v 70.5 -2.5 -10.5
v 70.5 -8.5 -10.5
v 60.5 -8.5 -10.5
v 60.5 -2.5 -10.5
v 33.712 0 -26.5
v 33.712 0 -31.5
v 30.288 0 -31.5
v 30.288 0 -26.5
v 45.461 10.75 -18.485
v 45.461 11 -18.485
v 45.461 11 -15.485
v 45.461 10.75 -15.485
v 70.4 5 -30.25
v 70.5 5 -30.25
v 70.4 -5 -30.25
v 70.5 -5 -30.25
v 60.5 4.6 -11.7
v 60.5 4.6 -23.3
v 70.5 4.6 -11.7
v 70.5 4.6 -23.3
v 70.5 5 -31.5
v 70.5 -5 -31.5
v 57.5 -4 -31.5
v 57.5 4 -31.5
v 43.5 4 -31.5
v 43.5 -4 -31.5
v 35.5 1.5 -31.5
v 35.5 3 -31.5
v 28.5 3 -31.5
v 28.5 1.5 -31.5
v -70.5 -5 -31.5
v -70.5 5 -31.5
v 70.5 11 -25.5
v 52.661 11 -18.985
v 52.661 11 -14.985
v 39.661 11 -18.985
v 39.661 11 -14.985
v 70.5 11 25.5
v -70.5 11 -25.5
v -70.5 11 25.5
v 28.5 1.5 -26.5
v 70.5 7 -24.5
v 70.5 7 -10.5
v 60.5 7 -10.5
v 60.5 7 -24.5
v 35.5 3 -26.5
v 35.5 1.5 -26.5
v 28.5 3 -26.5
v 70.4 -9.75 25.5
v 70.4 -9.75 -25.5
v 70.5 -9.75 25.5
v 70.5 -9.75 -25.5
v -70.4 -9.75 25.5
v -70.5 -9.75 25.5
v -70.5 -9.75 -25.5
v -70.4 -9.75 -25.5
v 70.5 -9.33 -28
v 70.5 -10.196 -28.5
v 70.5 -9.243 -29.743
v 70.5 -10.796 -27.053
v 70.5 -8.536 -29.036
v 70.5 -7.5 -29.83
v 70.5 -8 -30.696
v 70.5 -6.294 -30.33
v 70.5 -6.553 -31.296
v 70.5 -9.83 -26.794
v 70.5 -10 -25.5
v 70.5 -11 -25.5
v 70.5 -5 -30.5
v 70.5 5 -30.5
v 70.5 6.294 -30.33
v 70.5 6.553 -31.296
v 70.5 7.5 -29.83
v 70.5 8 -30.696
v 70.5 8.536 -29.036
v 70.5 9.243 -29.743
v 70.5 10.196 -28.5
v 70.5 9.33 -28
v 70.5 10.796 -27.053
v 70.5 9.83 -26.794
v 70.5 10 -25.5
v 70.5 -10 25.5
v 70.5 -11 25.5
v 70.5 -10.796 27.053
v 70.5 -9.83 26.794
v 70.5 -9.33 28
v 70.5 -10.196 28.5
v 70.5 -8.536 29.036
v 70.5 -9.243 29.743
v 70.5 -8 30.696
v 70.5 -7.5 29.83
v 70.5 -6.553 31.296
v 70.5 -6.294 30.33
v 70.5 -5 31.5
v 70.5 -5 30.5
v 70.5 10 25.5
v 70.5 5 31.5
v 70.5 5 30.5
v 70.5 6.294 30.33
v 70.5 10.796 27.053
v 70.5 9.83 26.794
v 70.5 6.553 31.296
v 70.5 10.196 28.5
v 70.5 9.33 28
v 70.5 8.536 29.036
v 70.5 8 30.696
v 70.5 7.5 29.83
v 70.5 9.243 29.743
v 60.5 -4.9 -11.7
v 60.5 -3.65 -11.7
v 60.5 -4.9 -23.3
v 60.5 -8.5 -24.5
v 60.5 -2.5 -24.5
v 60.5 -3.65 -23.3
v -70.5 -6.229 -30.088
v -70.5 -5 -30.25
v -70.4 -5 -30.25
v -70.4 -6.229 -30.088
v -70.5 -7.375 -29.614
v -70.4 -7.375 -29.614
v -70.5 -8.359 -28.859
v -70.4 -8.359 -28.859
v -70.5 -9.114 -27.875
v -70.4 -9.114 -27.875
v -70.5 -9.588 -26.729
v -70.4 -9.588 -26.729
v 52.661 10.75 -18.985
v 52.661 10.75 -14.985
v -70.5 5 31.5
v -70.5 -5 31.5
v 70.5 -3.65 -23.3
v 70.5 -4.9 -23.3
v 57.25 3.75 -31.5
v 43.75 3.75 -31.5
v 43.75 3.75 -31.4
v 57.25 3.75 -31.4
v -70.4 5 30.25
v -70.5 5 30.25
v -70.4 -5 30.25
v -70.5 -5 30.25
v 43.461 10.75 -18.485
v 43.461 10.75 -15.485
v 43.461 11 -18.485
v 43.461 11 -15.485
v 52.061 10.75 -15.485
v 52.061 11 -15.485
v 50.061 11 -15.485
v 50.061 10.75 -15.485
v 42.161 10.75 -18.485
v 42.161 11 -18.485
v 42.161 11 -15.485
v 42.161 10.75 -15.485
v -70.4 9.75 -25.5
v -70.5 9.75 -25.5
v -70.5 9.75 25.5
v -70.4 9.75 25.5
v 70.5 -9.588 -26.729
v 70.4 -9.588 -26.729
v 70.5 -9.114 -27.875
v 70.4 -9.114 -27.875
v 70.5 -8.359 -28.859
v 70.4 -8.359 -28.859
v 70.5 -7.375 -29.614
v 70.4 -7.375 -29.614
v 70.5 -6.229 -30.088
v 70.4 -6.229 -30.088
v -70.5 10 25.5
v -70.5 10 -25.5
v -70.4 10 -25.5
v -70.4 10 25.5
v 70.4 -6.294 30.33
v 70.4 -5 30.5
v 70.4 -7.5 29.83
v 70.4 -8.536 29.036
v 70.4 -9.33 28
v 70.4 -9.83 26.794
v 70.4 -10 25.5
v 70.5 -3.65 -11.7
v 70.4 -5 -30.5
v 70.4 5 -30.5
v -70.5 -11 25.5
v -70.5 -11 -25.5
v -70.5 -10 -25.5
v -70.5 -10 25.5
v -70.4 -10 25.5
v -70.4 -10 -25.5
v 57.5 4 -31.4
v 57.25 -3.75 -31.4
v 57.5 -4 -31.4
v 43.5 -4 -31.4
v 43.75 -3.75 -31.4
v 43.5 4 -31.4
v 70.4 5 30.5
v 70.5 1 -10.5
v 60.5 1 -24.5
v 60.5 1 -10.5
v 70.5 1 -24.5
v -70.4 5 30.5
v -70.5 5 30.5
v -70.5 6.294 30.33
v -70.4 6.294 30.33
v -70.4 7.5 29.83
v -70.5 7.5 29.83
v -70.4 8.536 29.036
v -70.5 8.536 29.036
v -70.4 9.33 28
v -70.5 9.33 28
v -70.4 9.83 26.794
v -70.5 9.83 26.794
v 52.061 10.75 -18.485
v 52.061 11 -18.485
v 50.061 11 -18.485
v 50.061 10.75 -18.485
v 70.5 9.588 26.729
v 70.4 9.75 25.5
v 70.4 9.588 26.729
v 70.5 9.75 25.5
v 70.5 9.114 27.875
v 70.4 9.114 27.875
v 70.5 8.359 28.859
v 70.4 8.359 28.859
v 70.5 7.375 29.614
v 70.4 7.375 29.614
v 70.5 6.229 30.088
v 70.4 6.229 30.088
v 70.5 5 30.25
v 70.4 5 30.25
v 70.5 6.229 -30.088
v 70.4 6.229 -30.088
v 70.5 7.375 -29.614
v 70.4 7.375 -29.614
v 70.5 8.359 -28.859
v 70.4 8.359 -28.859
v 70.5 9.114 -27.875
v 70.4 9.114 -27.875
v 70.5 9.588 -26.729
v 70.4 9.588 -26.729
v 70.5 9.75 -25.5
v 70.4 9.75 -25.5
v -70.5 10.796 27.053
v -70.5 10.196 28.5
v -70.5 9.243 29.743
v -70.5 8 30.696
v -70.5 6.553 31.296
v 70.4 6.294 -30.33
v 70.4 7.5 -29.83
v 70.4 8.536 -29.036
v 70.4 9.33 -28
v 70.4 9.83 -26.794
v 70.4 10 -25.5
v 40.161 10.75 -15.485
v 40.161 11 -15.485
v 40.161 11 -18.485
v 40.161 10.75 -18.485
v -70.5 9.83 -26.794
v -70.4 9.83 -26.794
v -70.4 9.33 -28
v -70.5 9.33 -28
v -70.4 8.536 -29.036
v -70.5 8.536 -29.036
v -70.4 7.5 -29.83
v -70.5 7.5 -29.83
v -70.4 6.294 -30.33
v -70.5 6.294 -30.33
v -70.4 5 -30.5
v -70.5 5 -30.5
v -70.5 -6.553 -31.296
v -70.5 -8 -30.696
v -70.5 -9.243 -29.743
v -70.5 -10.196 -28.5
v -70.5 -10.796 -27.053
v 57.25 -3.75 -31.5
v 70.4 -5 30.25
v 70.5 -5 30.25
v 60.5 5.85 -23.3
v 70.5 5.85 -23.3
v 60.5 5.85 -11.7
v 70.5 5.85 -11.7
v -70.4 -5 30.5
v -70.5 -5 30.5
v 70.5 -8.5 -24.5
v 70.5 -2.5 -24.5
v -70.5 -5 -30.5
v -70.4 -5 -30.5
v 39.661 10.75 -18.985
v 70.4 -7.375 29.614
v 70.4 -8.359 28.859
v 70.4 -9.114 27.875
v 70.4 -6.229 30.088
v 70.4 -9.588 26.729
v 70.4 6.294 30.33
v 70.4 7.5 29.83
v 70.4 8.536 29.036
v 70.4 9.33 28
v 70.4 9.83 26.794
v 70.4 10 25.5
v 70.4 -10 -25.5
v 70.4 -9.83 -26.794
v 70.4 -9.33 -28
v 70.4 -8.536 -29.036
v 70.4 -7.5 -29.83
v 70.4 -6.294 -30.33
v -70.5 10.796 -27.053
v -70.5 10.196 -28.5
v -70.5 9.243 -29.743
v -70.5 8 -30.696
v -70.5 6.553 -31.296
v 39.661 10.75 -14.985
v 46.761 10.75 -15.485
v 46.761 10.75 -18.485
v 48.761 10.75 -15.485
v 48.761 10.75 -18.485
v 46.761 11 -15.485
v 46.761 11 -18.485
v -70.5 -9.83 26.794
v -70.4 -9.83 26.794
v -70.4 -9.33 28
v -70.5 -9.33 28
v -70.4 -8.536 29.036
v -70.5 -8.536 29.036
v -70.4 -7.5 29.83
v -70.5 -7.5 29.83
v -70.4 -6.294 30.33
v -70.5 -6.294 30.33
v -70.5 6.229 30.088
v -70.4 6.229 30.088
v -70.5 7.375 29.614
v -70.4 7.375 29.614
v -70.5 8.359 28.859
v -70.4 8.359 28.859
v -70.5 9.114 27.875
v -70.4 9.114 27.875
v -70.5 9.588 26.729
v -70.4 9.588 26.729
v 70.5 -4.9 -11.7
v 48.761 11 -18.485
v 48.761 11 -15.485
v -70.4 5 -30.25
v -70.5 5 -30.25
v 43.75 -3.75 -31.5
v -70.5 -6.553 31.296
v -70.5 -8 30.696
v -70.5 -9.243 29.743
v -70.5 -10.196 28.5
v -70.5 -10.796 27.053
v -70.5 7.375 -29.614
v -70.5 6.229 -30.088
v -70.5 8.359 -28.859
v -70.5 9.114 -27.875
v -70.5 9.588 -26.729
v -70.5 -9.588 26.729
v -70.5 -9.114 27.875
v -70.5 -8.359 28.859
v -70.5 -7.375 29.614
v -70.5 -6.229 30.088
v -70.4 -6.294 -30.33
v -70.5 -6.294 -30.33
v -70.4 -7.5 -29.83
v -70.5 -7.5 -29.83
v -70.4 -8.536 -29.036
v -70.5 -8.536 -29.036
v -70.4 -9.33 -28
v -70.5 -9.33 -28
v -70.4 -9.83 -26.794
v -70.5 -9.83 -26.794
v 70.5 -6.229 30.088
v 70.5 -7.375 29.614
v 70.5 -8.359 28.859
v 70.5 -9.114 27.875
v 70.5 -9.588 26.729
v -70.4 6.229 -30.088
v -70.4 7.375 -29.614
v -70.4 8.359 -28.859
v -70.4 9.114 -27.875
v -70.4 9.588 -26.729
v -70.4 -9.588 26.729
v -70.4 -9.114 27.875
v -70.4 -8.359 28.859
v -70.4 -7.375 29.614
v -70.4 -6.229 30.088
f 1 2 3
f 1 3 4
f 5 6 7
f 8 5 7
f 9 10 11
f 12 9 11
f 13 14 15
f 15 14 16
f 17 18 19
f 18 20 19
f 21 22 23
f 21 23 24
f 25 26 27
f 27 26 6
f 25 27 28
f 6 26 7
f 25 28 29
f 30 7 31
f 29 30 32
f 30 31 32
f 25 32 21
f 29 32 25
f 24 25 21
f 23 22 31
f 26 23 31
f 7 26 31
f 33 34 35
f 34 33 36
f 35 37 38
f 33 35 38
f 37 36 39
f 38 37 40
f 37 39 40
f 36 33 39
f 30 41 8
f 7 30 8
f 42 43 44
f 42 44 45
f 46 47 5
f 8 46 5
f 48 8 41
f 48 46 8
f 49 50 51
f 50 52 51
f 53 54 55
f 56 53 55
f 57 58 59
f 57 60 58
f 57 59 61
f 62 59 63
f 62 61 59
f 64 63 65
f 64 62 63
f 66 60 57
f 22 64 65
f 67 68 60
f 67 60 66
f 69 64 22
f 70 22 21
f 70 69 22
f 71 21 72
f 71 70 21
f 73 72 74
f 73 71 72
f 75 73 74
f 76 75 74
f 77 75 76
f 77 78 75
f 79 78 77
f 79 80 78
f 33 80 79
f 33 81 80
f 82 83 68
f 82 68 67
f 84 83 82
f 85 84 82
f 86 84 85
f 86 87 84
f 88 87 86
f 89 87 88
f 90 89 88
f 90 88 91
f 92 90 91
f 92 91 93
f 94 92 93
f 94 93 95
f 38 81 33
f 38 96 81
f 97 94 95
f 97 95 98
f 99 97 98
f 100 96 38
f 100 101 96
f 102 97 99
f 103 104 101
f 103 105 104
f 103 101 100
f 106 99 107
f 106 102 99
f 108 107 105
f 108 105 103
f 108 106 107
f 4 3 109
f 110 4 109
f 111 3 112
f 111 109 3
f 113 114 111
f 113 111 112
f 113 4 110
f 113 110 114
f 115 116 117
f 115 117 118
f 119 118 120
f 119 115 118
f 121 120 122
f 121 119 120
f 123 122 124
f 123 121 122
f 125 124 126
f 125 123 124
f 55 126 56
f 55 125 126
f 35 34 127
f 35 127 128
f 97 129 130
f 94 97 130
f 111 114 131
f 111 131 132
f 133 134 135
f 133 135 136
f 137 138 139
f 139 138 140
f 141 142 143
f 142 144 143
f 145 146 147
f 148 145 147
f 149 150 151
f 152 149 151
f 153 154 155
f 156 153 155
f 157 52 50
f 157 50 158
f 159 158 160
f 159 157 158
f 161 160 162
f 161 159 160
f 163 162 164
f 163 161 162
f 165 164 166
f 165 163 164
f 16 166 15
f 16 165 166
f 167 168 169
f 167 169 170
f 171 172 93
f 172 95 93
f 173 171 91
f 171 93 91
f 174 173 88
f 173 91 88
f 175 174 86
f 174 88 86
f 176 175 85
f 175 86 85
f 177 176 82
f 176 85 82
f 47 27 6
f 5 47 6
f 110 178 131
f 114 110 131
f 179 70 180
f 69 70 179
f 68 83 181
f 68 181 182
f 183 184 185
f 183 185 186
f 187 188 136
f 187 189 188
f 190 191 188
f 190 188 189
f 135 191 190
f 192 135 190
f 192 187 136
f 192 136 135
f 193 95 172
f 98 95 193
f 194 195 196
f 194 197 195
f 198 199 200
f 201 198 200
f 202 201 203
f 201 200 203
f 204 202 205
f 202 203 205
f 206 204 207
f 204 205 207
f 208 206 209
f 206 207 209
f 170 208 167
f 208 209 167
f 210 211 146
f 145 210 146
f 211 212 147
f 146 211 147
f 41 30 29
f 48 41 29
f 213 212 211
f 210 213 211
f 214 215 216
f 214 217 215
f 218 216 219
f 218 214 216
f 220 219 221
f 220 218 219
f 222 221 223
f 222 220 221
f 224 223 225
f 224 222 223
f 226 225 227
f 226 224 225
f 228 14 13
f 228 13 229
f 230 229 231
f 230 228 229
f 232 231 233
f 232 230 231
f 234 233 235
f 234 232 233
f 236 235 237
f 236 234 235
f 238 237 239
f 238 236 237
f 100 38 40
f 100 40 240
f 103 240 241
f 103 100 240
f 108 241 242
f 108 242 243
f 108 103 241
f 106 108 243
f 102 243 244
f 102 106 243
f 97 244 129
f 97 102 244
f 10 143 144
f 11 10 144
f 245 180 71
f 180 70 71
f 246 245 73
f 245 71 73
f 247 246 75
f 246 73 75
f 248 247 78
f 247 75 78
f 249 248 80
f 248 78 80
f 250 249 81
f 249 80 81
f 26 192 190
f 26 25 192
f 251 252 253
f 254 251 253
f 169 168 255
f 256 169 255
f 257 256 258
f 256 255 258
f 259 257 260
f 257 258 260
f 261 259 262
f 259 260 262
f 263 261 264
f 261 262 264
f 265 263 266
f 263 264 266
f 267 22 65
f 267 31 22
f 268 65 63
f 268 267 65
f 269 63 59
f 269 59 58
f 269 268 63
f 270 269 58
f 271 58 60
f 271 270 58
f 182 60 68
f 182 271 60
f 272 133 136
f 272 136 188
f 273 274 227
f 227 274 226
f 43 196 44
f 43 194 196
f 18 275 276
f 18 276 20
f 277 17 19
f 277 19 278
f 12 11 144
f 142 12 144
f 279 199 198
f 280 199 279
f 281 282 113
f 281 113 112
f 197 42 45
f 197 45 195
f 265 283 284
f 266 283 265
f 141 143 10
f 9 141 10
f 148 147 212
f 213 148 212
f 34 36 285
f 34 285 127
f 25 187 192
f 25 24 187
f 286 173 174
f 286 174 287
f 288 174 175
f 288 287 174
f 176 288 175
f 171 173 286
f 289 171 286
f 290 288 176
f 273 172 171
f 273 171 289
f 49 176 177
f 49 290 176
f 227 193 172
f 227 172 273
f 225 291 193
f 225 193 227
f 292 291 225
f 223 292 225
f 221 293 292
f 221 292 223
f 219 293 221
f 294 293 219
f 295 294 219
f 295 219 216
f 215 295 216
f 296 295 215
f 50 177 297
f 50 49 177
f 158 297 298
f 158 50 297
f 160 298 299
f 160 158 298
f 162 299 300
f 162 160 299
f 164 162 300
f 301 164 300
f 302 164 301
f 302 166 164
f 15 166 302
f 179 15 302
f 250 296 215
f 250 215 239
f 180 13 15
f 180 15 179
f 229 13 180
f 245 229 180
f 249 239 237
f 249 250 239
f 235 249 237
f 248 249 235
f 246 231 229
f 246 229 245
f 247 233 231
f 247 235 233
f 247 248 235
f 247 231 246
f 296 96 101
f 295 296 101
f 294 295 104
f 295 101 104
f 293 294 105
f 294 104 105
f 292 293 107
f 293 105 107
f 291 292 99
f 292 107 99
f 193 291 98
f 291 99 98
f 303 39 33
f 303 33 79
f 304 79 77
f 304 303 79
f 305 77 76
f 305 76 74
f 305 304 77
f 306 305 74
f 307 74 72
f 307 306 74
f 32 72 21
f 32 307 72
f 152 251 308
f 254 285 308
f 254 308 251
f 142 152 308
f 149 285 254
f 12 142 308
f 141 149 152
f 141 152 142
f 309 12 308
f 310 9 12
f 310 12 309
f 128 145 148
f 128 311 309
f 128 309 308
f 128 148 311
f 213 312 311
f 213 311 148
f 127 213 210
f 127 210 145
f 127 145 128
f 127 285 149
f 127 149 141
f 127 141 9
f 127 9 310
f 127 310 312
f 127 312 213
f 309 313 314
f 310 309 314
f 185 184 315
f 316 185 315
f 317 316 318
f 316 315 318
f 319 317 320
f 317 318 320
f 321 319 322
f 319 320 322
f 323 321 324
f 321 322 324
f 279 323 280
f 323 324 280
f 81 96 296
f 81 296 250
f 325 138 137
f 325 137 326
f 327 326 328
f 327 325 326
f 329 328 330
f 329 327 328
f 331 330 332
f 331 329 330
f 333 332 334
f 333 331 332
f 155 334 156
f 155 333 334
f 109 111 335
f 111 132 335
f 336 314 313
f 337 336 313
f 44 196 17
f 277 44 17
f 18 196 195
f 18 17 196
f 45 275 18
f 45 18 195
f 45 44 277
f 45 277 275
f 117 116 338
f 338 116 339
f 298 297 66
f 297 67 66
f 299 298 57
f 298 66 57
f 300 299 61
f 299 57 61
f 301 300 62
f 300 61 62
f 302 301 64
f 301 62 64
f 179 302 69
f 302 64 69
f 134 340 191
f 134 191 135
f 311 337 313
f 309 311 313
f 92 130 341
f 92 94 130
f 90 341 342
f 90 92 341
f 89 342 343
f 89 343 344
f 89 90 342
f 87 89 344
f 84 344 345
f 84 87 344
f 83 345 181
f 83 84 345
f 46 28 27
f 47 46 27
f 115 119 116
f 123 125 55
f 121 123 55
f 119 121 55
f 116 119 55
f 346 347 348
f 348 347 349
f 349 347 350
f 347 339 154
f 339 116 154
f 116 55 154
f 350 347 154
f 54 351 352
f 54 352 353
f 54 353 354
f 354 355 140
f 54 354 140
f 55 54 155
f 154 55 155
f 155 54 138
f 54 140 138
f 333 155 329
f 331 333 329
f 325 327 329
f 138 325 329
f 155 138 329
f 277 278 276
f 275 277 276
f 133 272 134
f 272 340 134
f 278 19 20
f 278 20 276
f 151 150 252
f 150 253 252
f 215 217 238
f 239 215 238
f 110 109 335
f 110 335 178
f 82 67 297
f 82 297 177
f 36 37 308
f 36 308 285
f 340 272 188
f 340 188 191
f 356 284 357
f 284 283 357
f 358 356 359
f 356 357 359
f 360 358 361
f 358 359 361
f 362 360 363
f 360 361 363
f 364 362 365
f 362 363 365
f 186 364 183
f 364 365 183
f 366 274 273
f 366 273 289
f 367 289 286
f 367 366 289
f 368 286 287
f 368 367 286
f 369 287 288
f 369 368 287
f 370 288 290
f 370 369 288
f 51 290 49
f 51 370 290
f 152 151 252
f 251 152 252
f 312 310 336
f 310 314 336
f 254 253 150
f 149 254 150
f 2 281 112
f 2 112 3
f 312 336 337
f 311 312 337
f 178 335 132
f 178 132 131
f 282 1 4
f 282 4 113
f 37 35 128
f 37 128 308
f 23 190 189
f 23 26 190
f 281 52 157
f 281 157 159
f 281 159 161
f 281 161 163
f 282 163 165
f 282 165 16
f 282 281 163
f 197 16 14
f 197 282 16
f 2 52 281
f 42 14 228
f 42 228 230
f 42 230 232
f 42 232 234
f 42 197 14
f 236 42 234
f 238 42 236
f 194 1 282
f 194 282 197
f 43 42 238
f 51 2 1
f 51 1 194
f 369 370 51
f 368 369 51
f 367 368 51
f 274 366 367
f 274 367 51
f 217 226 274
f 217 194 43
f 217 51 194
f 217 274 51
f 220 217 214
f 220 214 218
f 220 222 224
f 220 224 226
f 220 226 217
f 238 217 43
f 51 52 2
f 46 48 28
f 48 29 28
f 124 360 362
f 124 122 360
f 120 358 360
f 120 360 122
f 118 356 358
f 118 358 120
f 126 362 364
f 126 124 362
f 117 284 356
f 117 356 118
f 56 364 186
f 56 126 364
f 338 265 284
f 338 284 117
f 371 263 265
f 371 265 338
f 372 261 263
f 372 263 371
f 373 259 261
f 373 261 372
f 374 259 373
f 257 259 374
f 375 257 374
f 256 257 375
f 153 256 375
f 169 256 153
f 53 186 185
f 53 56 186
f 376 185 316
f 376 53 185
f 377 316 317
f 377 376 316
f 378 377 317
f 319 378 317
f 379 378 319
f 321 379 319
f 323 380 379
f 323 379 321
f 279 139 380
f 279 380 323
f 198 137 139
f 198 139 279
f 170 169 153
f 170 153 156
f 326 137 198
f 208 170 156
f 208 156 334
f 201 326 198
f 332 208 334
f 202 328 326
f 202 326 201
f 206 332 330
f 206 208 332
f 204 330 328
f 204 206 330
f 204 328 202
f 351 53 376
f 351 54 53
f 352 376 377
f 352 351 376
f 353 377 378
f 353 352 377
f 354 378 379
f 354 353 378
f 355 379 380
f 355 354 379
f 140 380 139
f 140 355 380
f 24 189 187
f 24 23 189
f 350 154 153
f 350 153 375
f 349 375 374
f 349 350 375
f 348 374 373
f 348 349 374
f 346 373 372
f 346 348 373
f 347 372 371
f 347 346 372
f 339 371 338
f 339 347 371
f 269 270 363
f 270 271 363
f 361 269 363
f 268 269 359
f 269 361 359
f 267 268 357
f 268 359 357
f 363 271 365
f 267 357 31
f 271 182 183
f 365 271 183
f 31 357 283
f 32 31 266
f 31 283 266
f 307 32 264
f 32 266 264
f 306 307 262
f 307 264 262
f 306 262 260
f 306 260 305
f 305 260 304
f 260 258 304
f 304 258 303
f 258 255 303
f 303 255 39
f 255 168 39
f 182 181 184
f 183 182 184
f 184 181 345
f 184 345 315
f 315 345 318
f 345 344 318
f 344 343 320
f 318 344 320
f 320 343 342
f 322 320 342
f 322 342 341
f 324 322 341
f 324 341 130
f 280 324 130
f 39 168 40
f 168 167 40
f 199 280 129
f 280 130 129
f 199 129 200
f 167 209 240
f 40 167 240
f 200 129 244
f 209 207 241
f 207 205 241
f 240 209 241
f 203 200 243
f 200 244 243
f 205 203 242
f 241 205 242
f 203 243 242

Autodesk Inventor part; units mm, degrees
ref_plane "YZ Plane" through (0, 0, 0) normal (1, 0, 0) x (0, 1, 0)
ref_plane "XZ Plane" through (0, 0, 0) normal (0, 1, 0) x (-1, 0, 0)
ref_plane "XY Plane" through (0, 0, 0) normal (0, 0, 1) x (1, 0, 0)
sketch "Sketch1" plane through (0, 0, 0) normal (1, 0, 0) x (0, 1, 0)
  line L0 (11, 31.5) -> (-11, 31.5)
  line L1 (-11, 31.5) -> (-11, -31.5)
  line L2 (-11, -31.5) -> (11, -31.5)
  line L3 (11, -31.5) -> (11, 31.5)
  line L4 (11, 31.5) -> (-11, -31.5) construction
  line L5 (-11, 31.5) -> (11, -31.5) construction
  point P0 (0, 0)
  dimension "d0" = 22
  dimension "d1" = 63
extrude "Extrusion1" add sketch "Sketch1" along normal mid plane 141
fillet "Fillet1" radius 6 4 edges at (0, 11, 31.5) (0, 11, -31.5) (0, -11, 31.5) (0, -11, -31.5)
sketch "Sketch2" plane through (70.5, 0, 0) normal (1, 0, 0) x (0, 0, -1)
  line L0 (10.5, 7) -> (24.5, 7)
  line L1 (24.5, 7) -> (24.5, 1)
  line L2 (24.5, 1) -> (10.5, 1)
  line L3 (10.5, 1) -> (10.5, 7)
  line L4 (31.5, -5) -> (31.5, 5) projected
  line L5 (25.5, 11) -> (-25.5, 11) projected
  line L6 (11.7, 5.85) -> (23.3, 5.85)
  line L7 (23.3, 5.85) -> (23.3, 4.6)
  line L8 (23.3, 4.6) -> (11.7, 4.6)
  line L9 (11.7, 4.6) -> (11.7, 5.85)
  line L10 (10.5, -2.5) -> (24.5, -2.5)
  line L11 (24.5, -2.5) -> (24.5, -8.5)
  line L12 (24.5, -8.5) -> (10.5, -8.5)
  line L13 (10.5, -8.5) -> (10.5, -2.5)
  line L14 (11.7, -3.65) -> (23.3, -3.65)
  line L15 (23.3, -3.65) -> (23.3, -4.9)
  line L16 (23.3, -4.9) -> (11.7, -4.9)
  line L17 (11.7, -4.9) -> (11.7, -3.65)
  point P0 (0, 0)
  dimension "d5" = 14
  dimension "d6" = 6
  dimension "d7" = 7
  dimension "d8" = 4
  dimension "d12" = 1.2
  dimension "d13" = 1.2
  dimension "d14" = 1.15
  dimension "d15" = 3.6
  dimension "d16" = 14
  dimension "d17" = 6
  dimension "d18" = 1.2
  dimension "d19" = 1.2
  dimension "d20" = 1.15
  dimension "d21" = 3.6
  dimension "d22" = 3.5
extrude "Extrusion2" cut sketch "Sketch2" against normal blind 10
sketch "Sketch3" plane through (-70.5, 11, -25.5) normal (0, 1, 0) x (1, 0, 0)
  line L0 (110.1613, -6.5149) -> (123.1613, -6.5149)
  line L1 (123.1613, -6.5149) -> (123.1613, -10.5149)
  line L2 (123.1613, -10.5149) -> (110.1613, -10.5149)
  line L3 (110.1613, -10.5149) -> (110.1613, -6.5149)
  line L4 (110.6613, -7.0149) -> (112.6613, -7.0149)
  line L5 (112.6613, -7.0149) -> (112.6613, -10.0149)
  line L6 (112.6613, -10.0149) -> (110.6613, -10.0149)
  line L7 (110.6613, -10.0149) -> (110.6613, -7.0149)
  line L8 (115.9613, -10.0149) -> (113.9613, -10.0149)
  line L9 (113.9613, -10.0149) -> (113.9613, -7.0149)
  line L10 (113.9613, -7.0149) -> (115.9613, -7.0149)
  line L11 (115.9613, -7.0149) -> (115.9613, -10.0149)
  line L12 (119.2613, -10.0149) -> (117.2613, -10.0149)
  line L13 (117.2613, -10.0149) -> (117.2613, -7.0149)
  line L14 (117.2613, -7.0149) -> (119.2613, -7.0149)
  line L15 (119.2613, -7.0149) -> (119.2613, -10.0149)
  line L16 (122.5613, -10.0149) -> (120.5613, -10.0149)
  line L17 (120.5613, -10.0149) -> (120.5613, -7.0149)
  line L18 (120.5613, -7.0149) -> (122.5613, -7.0149)
  line L19 (122.5613, -7.0149) -> (122.5613, -10.0149)
  point P0 (70.5, -25.5)
  dimension "d25" = 13
  dimension "d26" = 4
  dimension "d27" = 2
  dimension "d28" = 3
  dimension "d29" = 0.5
  dimension "d30" = 0.5
  dimension "d33" = 3.3
extrude "Extrusion3" cut sketch "Sketch3" against normal blind 0.25
sketch "Sketch4" plane through (70.5, -5, -31.5) normal (0, 0, -1) x (-1, 0, 0)
  line L0 (141, 10) -> (0, 10) construction
  line L1 (0, 0) -> (0, 10) construction
  line L2 (35, 5) -> (42, 5)
  line L3 (42, 5) -> (42, 8)
  line L4 (42, 8) -> (35, 8)
  line L5 (35, 8) -> (35, 5)
  line L6 (38.5, 5) -> (38.5, 8) construction
  line L7 (35, 6.5) -> (36.7876, 5)
  line L8 (35, 6.5) -> (37.3336, 6.5) construction
  line L9 (42, 6.5) -> (40.2124, 5)
  line L10 (42, 6.5) -> (42, 5)
  line L11 (40.2124, 5) -> (42, 5)
  point P0 (70.5, 5)
  dimension "d42" = 3
  dimension "d43" = 35
  dimension "d44" = 7
  dimension "d45" = 2
  dimension "d46" = 40
extrude "Extrusion4" cut sketch "Sketch4" against normal blind 5 contours L7 L5 L4 L3 L9 L2
sketch "Sketch5" plane through (70.5, -5, -31.5) normal (0, 0, -1) x (-1, 0, 0)
  line L0 (0, 0) -> (0, 10) construction
  line L1 (0, 5) -> (141, 5) construction
  line L2 (141, 10) -> (141, 0) construction
  line L3 (13, 9) -> (27, 9)
  line L4 (27, 9) -> (27, 1)
  line L5 (27, 1) -> (13, 1)
  line L6 (13, 1) -> (13, 9)
  line L7 (13, 9) -> (27, 1) construction
  line L8 (27, 9) -> (13, 1) construction
  line L9 (26.75, 8.75) -> (13.25, 8.75)
  line L10 (13.25, 8.75) -> (13.25, 1.25)
  line L11 (13.25, 1.25) -> (26.75, 1.25)
  line L12 (26.75, 1.25) -> (26.75, 8.75)
  line L13 (35, 6.5) -> (35, 8) projected
  point P0 (70.5, 5)
  point P1 (20, 5)
  dimension "d49" = 14
  dimension "d50" = 8
  dimension "d51" = 0.25
  dimension "d52" = 8
extrude "Extrusion5" cut sketch "Sketch5" against normal blind 0.1
sketch "Sketch6" plane through (70.5, 0, 0) normal (1, 0, 0) x (0, 0, -1)
  line L0 (10.5, 1) -> (10.5, 7) projected
  line L1 (10.5, 7) -> (24.5, 7) projected
  line L2 (24.5, 7) -> (24.5, 1) projected
  line L3 (24.5, 1) -> (10.5, 1) projected
  line L4 (10.5, -8.5) -> (10.5, -2.5) projected
  line L5 (10.5, -2.5) -> (24.5, -2.5) projected
  line L6 (24.5, -2.5) -> (24.5, -8.5) projected
  line L7 (24.5, -8.5) -> (10.5, -8.5) projected
  arc A0 (25.5, -11) -> (31.5, -5) centre (25.5, -5) ccw projected
  line L8 (31.5, -5) -> (31.5, 5) projected
  arc A1 (31.5, 5) -> (25.5, 11) centre (25.5, 5) ccw projected
  line L9 (25.5, 11) -> (-25.5, 11) projected
  arc A2 (-25.5, 11) -> (-31.5, 5) centre (-25.5, 5) ccw projected
  line L10 (-31.5, 5) -> (-31.5, -5) projected
  arc A3 (-31.5, -5) -> (-25.5, -11) centre (-25.5, -5) ccw projected
  line L11 (-25.5, -11) -> (25.5, -11) projected
  line L12 (-25.5, 10) -> (25.5, 10)
  arc A4 (30.5, 5) -> (25.5, 10) centre (25.5, 5) ccw
  line L13 (30.5, 5) -> (30.5, -5)
  arc A5 (25.5, -10) -> (30.5, -5) centre (25.5, -5) ccw
  line L14 (25.5, -10) -> (-25.5, -10)
  arc A6 (-30.5, -5) -> (-25.5, -10) centre (-25.5, -5) ccw
  line L15 (-30.5, -5) -> (-30.5, 5)
  arc A7 (-25.5, 10) -> (-30.5, 5) centre (-25.5, 5) ccw
  line L16 (-25.5, 9.75) -> (25.5, 9.75)
  arc A8 (30.25, 5) -> (25.5, 9.75) centre (25.5, 5) ccw
  line L17 (30.25, 5) -> (30.25, -5)
  arc A9 (25.5, -9.75) -> (30.25, -5) centre (25.5, -5) ccw
  line L18 (25.5, -9.75) -> (-25.5, -9.75)
  arc A10 (-30.25, -5) -> (-25.5, -9.75) centre (-25.5, -5) ccw
  line L19 (-30.25, -5) -> (-30.25, 5)
  arc A11 (-25.5, 9.75) -> (-30.25, 5) centre (-25.5, 5) ccw
  point P0 (0, 0)
  dimension "d55" = 1
  dimension "d56" = 1.25
extrude "Extrusion6" cut sketch "Sketch6" against normal blind 0.1 contours L12 A4 L13 A5 L14 A6 L15 A7
mirror "Mirror1" about plane through (0, 0, 0) normal (1, 0, 0) of "Extrusion6"
properties part number "Battery"
